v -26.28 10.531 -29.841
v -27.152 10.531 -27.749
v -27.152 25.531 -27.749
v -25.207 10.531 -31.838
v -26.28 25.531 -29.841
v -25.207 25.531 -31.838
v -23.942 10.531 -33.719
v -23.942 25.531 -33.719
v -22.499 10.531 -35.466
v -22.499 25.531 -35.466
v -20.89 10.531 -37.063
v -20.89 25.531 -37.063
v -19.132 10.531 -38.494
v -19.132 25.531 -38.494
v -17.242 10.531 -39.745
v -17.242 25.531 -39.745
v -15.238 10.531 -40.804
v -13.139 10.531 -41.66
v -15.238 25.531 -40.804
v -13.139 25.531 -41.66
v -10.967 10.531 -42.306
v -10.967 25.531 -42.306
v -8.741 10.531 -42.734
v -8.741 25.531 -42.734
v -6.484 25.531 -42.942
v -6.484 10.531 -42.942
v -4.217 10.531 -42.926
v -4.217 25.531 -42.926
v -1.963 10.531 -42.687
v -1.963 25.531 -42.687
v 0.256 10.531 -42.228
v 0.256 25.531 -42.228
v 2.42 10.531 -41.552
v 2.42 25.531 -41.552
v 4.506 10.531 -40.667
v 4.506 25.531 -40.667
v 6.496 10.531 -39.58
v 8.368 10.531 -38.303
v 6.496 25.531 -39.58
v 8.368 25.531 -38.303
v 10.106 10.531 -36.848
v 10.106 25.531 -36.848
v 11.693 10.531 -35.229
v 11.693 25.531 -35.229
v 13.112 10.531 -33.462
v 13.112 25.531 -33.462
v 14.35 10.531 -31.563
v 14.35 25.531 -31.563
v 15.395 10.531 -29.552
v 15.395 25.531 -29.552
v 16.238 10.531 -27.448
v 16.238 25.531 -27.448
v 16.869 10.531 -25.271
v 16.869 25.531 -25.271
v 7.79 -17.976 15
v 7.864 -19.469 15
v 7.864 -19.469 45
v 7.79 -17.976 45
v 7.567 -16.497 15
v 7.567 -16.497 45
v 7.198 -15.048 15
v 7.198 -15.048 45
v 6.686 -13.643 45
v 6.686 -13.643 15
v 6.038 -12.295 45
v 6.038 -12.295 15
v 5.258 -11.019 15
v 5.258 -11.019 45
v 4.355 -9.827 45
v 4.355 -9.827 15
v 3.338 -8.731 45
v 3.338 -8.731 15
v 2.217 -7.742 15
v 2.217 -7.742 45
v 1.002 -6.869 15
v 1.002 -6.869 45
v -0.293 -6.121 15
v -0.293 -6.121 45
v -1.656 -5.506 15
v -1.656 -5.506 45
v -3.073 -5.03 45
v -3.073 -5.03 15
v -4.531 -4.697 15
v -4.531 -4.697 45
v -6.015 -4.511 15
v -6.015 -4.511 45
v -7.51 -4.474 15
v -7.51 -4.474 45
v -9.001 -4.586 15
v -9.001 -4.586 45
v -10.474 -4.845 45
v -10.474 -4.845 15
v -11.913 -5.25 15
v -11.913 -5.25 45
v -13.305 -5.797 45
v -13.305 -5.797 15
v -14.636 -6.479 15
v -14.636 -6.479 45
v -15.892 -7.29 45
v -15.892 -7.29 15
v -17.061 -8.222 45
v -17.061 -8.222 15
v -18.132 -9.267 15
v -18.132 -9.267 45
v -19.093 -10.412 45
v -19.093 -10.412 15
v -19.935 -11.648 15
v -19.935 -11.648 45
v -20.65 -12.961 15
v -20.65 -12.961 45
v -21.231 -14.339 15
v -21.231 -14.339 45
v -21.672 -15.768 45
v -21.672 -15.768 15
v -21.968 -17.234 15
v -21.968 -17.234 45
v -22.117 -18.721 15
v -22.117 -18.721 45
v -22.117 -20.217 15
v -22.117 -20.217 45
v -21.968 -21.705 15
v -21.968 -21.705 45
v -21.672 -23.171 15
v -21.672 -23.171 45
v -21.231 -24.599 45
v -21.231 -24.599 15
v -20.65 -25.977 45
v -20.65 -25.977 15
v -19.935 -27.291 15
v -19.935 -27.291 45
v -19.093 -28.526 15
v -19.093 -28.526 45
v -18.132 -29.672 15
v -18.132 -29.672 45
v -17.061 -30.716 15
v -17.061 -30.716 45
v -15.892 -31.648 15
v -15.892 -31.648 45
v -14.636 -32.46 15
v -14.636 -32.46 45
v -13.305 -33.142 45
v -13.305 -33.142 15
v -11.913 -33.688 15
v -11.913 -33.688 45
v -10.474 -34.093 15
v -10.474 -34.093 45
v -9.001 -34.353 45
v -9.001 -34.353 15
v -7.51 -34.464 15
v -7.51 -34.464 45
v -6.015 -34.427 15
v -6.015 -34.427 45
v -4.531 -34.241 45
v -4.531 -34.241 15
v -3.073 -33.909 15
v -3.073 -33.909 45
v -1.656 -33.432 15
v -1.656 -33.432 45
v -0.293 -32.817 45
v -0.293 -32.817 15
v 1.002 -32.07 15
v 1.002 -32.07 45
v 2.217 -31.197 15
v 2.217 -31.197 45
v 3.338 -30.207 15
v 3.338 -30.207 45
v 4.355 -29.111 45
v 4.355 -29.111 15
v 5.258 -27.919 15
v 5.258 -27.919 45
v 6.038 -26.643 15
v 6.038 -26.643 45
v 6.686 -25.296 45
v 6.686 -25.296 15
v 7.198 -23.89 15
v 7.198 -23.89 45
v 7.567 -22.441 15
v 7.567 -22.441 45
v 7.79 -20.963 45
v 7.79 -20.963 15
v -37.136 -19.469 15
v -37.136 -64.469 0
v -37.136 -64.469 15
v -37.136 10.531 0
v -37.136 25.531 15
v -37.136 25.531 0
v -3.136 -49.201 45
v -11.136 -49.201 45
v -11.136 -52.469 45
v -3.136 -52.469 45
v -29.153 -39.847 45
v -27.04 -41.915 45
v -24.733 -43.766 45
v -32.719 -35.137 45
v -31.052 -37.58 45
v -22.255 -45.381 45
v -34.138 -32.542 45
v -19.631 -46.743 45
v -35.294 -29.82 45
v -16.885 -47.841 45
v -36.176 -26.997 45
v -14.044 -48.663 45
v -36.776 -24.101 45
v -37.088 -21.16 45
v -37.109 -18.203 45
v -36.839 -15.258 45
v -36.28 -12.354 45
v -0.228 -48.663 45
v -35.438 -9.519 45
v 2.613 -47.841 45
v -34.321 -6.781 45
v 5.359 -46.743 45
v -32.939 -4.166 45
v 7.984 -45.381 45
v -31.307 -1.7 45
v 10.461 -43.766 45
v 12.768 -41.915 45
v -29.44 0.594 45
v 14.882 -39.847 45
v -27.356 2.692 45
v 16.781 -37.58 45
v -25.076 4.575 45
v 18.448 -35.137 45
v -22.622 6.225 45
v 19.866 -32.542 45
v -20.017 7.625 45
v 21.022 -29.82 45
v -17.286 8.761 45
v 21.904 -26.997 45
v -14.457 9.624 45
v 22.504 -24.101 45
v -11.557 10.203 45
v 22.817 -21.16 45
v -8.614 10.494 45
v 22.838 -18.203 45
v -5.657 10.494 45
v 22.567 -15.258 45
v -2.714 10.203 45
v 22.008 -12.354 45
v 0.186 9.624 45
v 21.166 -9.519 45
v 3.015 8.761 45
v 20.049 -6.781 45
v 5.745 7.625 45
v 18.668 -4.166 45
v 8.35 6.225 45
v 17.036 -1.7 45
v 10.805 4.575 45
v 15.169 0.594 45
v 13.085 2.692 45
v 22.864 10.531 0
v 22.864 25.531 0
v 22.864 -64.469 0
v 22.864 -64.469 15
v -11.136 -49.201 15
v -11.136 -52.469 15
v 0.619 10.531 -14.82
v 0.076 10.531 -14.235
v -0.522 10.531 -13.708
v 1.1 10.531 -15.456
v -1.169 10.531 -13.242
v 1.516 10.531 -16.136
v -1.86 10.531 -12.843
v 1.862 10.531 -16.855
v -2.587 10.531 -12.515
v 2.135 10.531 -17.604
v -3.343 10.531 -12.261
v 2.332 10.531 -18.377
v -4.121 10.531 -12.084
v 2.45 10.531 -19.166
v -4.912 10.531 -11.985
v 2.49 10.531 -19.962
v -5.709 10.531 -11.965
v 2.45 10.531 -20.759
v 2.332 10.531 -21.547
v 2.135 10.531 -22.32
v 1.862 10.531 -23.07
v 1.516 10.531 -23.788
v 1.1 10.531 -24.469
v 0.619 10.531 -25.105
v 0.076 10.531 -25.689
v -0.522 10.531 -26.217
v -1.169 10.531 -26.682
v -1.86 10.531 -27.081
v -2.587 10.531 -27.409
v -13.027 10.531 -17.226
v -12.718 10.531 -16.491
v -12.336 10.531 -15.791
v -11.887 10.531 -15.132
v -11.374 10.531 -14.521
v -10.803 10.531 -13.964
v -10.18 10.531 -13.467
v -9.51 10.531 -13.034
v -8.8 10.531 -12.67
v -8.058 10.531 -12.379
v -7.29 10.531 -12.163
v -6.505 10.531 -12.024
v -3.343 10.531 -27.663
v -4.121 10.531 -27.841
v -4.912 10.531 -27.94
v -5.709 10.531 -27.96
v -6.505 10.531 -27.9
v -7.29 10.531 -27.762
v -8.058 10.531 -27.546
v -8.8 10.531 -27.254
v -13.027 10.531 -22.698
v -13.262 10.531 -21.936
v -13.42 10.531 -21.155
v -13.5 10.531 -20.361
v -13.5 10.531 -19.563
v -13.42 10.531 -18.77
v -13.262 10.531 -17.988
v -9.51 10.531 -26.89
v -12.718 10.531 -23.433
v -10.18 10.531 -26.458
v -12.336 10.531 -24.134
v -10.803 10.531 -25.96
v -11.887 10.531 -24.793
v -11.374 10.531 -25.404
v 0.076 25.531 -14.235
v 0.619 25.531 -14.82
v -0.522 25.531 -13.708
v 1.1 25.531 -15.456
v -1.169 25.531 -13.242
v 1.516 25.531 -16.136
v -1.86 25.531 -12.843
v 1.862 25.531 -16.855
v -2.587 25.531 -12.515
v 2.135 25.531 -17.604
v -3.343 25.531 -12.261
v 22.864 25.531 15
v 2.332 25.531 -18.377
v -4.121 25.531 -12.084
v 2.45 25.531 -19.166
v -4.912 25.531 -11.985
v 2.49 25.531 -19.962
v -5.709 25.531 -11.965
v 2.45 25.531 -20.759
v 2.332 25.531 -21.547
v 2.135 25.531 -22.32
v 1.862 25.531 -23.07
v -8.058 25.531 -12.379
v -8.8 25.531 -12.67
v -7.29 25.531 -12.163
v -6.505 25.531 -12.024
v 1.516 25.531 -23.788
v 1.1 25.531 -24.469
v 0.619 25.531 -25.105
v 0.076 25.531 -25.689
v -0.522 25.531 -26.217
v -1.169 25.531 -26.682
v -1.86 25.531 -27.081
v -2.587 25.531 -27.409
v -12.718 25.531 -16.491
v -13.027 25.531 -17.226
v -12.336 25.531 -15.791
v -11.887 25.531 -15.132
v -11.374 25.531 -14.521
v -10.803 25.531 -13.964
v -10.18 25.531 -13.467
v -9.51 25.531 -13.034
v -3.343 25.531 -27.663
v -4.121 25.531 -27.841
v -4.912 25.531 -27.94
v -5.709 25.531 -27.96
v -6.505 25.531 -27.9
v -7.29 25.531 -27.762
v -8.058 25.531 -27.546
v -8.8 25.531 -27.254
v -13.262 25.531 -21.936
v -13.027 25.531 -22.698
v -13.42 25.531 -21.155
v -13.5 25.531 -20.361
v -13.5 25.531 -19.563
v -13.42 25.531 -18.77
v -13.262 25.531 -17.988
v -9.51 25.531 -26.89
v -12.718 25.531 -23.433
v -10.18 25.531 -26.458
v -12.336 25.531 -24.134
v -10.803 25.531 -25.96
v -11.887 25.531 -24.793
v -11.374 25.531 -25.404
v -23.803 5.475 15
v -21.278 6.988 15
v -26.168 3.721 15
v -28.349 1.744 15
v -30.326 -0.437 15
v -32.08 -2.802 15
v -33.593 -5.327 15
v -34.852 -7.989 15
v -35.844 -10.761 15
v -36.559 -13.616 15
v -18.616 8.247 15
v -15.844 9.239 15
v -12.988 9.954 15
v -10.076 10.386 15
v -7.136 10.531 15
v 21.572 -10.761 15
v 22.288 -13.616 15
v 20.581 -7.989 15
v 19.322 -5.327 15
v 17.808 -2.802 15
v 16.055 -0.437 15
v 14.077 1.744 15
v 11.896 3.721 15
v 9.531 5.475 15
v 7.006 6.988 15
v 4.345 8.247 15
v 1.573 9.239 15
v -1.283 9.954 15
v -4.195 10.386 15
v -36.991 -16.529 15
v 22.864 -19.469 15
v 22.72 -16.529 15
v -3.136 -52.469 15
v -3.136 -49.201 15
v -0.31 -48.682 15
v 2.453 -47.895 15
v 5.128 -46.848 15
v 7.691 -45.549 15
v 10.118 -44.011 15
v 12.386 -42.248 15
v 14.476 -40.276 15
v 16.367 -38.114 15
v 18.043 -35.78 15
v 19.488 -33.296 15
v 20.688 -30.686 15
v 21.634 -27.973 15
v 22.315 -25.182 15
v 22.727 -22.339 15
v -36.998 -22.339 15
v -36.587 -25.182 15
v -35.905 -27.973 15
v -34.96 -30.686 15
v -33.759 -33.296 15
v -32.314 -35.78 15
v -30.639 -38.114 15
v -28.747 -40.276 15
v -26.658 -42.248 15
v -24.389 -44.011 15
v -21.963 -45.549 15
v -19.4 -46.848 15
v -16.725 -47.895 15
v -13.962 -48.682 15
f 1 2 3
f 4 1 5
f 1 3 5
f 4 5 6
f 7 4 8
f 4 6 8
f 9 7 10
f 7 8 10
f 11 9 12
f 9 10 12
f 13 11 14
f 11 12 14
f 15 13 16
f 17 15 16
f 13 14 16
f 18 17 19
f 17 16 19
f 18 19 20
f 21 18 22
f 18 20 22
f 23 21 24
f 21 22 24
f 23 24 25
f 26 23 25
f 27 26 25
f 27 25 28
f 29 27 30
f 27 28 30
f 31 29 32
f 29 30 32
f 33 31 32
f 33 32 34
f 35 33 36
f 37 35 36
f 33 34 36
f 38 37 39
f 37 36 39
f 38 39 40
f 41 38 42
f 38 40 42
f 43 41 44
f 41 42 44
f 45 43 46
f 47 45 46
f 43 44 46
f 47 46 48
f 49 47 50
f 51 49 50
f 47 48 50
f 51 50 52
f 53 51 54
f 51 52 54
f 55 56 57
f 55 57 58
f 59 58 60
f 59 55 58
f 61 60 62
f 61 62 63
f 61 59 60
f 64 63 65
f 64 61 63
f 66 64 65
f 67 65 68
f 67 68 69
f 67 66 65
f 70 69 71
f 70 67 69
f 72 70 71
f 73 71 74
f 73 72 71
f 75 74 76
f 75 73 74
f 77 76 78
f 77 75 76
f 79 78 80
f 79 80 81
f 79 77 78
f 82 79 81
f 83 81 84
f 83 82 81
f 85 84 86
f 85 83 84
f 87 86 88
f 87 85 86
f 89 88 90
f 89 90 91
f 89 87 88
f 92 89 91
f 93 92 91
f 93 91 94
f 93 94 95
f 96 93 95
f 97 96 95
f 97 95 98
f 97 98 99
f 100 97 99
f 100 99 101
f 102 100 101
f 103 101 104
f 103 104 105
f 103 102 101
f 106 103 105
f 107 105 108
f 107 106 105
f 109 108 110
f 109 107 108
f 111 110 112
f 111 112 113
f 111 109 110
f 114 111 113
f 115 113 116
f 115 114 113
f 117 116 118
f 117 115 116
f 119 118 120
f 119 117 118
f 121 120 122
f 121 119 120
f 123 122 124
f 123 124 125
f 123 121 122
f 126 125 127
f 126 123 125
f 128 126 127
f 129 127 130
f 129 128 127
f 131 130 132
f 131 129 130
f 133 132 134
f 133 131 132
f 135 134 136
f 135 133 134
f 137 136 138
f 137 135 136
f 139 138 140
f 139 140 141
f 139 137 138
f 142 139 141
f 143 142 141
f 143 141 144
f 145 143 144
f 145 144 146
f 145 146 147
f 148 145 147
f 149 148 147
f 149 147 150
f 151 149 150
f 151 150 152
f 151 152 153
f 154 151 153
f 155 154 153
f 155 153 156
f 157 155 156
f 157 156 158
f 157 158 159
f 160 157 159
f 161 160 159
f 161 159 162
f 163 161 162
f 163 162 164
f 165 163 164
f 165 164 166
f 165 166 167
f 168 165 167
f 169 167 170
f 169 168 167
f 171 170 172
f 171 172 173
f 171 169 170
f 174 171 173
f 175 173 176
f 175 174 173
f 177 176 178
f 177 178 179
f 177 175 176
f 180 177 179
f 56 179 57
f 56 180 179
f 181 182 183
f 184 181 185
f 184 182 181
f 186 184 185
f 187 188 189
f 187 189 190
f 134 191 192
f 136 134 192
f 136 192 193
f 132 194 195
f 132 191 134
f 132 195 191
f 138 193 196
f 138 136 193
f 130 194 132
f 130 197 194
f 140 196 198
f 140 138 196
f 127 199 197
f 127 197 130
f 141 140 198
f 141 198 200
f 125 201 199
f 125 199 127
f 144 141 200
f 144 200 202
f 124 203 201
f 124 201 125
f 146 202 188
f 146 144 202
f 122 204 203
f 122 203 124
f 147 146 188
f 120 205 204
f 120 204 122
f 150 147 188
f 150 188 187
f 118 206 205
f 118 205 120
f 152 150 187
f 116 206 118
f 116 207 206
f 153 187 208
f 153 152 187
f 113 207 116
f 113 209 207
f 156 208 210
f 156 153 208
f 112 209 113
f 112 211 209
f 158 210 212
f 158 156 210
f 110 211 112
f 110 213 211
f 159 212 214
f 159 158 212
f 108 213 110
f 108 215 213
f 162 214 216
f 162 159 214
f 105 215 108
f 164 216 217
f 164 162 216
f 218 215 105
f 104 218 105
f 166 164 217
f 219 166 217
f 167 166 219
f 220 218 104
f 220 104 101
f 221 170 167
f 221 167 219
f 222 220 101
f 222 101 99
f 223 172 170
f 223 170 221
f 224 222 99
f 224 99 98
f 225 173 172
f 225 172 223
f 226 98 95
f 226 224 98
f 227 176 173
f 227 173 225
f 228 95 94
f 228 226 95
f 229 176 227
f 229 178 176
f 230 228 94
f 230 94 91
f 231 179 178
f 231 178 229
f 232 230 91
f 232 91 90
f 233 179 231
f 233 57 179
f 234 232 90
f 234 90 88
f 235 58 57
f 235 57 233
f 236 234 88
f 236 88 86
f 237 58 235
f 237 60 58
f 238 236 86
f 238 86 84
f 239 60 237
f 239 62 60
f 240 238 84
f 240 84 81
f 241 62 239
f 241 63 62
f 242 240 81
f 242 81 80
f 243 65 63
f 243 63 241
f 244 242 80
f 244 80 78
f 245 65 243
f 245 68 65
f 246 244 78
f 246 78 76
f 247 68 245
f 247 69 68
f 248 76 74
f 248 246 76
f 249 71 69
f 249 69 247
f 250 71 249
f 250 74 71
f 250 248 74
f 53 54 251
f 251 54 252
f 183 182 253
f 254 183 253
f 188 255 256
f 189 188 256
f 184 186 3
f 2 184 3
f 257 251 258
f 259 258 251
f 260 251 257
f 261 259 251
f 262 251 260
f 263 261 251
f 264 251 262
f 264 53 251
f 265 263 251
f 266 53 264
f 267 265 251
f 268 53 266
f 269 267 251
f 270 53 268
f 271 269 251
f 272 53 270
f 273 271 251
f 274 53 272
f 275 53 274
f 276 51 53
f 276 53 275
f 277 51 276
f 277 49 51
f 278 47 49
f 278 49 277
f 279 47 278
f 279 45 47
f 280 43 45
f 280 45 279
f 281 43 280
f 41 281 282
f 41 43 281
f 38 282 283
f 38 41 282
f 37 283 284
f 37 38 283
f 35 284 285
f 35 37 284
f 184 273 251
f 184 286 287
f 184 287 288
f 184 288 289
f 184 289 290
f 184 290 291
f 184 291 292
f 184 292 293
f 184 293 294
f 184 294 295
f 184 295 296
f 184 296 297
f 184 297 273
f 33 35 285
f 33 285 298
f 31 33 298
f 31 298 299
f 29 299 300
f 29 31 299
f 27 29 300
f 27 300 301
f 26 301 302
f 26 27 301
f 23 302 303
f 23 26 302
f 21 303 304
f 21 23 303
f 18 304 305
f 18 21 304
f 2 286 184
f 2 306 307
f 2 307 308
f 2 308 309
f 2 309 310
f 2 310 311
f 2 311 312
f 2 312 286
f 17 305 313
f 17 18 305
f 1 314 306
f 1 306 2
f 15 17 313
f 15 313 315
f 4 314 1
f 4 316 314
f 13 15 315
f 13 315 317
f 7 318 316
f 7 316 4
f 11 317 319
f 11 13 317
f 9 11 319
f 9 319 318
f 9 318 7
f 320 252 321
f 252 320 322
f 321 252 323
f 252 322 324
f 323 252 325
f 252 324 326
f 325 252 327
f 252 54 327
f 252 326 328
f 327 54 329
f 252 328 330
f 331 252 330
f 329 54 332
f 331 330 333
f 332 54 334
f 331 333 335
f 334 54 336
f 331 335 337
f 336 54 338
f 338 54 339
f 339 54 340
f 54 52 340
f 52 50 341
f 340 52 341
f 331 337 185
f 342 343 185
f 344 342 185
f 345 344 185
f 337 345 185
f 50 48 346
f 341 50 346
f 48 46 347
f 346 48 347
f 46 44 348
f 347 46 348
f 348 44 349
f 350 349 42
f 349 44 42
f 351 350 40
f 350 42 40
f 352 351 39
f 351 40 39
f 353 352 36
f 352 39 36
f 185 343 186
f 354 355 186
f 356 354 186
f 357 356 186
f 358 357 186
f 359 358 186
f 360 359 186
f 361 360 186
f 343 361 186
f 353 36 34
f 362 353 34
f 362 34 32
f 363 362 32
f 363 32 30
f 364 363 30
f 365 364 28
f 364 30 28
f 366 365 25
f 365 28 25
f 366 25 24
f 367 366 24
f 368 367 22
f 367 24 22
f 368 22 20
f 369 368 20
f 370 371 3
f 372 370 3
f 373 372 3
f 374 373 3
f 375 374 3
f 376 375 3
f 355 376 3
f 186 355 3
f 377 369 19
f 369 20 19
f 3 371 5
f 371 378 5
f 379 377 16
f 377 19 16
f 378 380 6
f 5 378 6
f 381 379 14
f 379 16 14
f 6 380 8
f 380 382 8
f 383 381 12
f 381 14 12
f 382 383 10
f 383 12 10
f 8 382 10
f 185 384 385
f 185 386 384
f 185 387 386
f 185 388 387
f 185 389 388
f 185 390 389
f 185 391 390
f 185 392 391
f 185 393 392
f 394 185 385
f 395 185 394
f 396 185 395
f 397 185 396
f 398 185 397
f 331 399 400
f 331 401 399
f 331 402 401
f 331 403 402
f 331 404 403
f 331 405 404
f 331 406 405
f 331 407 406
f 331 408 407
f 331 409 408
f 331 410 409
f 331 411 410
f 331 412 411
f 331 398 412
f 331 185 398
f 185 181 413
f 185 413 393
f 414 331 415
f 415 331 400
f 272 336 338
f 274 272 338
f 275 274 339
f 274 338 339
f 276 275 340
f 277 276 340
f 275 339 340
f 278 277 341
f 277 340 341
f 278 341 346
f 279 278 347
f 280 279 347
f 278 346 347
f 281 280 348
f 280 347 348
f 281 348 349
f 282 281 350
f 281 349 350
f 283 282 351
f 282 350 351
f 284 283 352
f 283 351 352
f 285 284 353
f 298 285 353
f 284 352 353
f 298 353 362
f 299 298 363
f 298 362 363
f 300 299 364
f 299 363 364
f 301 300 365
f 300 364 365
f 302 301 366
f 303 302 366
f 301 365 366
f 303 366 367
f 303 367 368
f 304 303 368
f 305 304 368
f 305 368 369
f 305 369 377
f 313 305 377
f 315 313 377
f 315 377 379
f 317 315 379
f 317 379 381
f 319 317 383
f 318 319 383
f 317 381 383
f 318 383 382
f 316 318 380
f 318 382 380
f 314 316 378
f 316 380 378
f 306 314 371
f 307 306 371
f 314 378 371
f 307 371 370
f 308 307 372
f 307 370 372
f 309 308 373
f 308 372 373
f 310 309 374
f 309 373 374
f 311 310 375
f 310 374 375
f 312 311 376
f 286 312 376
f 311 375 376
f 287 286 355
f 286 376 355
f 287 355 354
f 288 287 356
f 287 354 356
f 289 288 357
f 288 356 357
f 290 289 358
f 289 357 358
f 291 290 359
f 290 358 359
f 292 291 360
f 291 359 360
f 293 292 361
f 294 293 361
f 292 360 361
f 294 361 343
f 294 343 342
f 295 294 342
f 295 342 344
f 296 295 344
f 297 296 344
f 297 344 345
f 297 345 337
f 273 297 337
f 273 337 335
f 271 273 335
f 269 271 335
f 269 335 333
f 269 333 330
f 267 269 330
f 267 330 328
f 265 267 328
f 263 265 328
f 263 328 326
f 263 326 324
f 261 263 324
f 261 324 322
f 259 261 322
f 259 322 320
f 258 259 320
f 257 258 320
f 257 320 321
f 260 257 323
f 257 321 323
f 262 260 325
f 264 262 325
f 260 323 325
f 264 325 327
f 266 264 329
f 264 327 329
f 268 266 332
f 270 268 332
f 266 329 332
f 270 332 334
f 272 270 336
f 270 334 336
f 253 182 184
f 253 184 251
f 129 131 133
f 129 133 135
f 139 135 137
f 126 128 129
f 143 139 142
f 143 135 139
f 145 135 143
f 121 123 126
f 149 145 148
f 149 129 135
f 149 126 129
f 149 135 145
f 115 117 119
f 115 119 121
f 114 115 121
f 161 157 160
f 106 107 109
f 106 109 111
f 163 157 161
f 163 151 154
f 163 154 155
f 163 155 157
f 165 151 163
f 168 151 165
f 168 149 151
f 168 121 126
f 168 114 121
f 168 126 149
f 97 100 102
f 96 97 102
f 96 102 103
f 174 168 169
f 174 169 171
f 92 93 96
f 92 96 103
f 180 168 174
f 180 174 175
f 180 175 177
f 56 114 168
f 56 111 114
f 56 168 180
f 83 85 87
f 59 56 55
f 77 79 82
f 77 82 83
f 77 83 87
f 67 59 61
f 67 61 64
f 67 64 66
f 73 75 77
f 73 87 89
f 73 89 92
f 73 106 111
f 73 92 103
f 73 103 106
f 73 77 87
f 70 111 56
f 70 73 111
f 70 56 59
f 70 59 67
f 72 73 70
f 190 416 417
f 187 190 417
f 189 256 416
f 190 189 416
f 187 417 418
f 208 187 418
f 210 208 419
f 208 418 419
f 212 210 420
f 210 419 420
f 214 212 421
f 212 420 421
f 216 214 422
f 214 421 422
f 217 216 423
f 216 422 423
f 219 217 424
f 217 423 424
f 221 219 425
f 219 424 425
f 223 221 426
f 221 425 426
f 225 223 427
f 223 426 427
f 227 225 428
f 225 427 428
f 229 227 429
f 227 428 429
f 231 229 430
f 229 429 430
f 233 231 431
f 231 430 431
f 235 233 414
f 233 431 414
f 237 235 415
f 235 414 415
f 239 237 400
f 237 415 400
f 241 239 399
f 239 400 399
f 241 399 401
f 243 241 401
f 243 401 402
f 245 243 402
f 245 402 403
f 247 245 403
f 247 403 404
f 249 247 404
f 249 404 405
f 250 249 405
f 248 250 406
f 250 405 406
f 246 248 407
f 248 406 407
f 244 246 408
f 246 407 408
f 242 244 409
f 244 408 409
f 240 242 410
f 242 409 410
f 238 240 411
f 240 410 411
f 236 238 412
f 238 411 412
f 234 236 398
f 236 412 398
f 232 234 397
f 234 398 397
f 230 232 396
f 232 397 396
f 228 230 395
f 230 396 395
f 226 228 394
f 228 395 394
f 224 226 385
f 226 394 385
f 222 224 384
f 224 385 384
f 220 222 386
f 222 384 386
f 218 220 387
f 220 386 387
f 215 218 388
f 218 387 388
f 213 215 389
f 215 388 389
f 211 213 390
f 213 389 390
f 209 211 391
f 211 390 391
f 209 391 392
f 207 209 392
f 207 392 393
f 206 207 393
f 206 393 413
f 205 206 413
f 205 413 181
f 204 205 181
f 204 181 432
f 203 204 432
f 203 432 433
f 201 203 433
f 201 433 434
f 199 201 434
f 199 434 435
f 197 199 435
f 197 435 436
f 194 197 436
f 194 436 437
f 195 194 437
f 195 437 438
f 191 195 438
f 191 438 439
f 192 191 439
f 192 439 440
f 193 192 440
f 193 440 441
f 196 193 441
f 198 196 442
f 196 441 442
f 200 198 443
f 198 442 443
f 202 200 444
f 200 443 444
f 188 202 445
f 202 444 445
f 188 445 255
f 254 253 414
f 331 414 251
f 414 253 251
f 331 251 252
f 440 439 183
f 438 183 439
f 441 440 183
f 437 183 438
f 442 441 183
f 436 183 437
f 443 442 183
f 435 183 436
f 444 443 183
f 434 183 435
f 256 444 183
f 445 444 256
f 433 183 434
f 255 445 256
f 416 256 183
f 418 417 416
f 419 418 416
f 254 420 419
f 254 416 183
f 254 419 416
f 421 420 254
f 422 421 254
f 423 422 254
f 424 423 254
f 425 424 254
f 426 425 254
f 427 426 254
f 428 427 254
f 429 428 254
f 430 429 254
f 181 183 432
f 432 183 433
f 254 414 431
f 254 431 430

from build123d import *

# Parameters (mm, degrees)
SKETCH1_W           = 60
SKETCH1_H           = 90
BOSS_EXTRUDE1_DEPTH = 15
SKETCH2_R           = 15
BOSS_EXTRUDE2_DEPTH = 30
SKETCH3_R           = 8
BOSS_EXTRUDE5_DEPTH = 15


with BuildPart() as part:
    # Sketch1 → Boss-Extrude1 (new body)
    with BuildSketch(Plane.XY):
        with Locations((-7.135767077, -19.469160134)):
            Rectangle(SKETCH1_W, SKETCH1_H)
    extrude(amount=BOSS_EXTRUDE1_DEPTH)

    # Sketch2 → Boss-Extrude2 (add)
    with BuildSketch(Plane.XY.offset(15)):
        with BuildLine():
            Line((-11.135767077, -49.201297629), (-11.135767077, -52.469160134))
            Line((-11.135767077, -52.469160134), (-3.135767077, -52.469160134))
            Line((-3.135767077, -52.469160134), (-3.135767077, -49.201297629))
            ThreePointArc((-3.135767077, -49.201297629), (-7.135767077, 10.530839866), (-11.135767077, -49.201297629))
        make_face()
        with Locations((-7.135767077, -19.469160134)):
            Circle(SKETCH2_R, mode=Mode.SUBTRACT)
    extrude(amount=BOSS_EXTRUDE2_DEPTH)

    # Sketch3 → Boss-Extrude5 (add)
    with BuildSketch(Plane(origin=(0, 25.530839866, 0), x_dir=(1, 0, 0), z_dir=(0, 1, 0))):
        with BuildLine():
            Line((-7.135767077, 0), (-37.135767077, 0))
            Line((-37.135767077, 0), (-27.151506269, 27.74903454))
            ThreePointArc((-27.151506269, 27.74903454), (-4.217160927, 42.925858918), (16.869139504, 25.271167514))
            Line((16.869139504, 25.271167514), (22.864232923, 0))
            Line((22.864232923, 0), (-7.135767077, 0))
        make_face()
        with Locations((-5.509756001, 19.962209426)):
            Circle(SKETCH3_R, mode=Mode.SUBTRACT)
    extrude(amount=-BOSS_EXTRUDE5_DEPTH)


solid = part.part
